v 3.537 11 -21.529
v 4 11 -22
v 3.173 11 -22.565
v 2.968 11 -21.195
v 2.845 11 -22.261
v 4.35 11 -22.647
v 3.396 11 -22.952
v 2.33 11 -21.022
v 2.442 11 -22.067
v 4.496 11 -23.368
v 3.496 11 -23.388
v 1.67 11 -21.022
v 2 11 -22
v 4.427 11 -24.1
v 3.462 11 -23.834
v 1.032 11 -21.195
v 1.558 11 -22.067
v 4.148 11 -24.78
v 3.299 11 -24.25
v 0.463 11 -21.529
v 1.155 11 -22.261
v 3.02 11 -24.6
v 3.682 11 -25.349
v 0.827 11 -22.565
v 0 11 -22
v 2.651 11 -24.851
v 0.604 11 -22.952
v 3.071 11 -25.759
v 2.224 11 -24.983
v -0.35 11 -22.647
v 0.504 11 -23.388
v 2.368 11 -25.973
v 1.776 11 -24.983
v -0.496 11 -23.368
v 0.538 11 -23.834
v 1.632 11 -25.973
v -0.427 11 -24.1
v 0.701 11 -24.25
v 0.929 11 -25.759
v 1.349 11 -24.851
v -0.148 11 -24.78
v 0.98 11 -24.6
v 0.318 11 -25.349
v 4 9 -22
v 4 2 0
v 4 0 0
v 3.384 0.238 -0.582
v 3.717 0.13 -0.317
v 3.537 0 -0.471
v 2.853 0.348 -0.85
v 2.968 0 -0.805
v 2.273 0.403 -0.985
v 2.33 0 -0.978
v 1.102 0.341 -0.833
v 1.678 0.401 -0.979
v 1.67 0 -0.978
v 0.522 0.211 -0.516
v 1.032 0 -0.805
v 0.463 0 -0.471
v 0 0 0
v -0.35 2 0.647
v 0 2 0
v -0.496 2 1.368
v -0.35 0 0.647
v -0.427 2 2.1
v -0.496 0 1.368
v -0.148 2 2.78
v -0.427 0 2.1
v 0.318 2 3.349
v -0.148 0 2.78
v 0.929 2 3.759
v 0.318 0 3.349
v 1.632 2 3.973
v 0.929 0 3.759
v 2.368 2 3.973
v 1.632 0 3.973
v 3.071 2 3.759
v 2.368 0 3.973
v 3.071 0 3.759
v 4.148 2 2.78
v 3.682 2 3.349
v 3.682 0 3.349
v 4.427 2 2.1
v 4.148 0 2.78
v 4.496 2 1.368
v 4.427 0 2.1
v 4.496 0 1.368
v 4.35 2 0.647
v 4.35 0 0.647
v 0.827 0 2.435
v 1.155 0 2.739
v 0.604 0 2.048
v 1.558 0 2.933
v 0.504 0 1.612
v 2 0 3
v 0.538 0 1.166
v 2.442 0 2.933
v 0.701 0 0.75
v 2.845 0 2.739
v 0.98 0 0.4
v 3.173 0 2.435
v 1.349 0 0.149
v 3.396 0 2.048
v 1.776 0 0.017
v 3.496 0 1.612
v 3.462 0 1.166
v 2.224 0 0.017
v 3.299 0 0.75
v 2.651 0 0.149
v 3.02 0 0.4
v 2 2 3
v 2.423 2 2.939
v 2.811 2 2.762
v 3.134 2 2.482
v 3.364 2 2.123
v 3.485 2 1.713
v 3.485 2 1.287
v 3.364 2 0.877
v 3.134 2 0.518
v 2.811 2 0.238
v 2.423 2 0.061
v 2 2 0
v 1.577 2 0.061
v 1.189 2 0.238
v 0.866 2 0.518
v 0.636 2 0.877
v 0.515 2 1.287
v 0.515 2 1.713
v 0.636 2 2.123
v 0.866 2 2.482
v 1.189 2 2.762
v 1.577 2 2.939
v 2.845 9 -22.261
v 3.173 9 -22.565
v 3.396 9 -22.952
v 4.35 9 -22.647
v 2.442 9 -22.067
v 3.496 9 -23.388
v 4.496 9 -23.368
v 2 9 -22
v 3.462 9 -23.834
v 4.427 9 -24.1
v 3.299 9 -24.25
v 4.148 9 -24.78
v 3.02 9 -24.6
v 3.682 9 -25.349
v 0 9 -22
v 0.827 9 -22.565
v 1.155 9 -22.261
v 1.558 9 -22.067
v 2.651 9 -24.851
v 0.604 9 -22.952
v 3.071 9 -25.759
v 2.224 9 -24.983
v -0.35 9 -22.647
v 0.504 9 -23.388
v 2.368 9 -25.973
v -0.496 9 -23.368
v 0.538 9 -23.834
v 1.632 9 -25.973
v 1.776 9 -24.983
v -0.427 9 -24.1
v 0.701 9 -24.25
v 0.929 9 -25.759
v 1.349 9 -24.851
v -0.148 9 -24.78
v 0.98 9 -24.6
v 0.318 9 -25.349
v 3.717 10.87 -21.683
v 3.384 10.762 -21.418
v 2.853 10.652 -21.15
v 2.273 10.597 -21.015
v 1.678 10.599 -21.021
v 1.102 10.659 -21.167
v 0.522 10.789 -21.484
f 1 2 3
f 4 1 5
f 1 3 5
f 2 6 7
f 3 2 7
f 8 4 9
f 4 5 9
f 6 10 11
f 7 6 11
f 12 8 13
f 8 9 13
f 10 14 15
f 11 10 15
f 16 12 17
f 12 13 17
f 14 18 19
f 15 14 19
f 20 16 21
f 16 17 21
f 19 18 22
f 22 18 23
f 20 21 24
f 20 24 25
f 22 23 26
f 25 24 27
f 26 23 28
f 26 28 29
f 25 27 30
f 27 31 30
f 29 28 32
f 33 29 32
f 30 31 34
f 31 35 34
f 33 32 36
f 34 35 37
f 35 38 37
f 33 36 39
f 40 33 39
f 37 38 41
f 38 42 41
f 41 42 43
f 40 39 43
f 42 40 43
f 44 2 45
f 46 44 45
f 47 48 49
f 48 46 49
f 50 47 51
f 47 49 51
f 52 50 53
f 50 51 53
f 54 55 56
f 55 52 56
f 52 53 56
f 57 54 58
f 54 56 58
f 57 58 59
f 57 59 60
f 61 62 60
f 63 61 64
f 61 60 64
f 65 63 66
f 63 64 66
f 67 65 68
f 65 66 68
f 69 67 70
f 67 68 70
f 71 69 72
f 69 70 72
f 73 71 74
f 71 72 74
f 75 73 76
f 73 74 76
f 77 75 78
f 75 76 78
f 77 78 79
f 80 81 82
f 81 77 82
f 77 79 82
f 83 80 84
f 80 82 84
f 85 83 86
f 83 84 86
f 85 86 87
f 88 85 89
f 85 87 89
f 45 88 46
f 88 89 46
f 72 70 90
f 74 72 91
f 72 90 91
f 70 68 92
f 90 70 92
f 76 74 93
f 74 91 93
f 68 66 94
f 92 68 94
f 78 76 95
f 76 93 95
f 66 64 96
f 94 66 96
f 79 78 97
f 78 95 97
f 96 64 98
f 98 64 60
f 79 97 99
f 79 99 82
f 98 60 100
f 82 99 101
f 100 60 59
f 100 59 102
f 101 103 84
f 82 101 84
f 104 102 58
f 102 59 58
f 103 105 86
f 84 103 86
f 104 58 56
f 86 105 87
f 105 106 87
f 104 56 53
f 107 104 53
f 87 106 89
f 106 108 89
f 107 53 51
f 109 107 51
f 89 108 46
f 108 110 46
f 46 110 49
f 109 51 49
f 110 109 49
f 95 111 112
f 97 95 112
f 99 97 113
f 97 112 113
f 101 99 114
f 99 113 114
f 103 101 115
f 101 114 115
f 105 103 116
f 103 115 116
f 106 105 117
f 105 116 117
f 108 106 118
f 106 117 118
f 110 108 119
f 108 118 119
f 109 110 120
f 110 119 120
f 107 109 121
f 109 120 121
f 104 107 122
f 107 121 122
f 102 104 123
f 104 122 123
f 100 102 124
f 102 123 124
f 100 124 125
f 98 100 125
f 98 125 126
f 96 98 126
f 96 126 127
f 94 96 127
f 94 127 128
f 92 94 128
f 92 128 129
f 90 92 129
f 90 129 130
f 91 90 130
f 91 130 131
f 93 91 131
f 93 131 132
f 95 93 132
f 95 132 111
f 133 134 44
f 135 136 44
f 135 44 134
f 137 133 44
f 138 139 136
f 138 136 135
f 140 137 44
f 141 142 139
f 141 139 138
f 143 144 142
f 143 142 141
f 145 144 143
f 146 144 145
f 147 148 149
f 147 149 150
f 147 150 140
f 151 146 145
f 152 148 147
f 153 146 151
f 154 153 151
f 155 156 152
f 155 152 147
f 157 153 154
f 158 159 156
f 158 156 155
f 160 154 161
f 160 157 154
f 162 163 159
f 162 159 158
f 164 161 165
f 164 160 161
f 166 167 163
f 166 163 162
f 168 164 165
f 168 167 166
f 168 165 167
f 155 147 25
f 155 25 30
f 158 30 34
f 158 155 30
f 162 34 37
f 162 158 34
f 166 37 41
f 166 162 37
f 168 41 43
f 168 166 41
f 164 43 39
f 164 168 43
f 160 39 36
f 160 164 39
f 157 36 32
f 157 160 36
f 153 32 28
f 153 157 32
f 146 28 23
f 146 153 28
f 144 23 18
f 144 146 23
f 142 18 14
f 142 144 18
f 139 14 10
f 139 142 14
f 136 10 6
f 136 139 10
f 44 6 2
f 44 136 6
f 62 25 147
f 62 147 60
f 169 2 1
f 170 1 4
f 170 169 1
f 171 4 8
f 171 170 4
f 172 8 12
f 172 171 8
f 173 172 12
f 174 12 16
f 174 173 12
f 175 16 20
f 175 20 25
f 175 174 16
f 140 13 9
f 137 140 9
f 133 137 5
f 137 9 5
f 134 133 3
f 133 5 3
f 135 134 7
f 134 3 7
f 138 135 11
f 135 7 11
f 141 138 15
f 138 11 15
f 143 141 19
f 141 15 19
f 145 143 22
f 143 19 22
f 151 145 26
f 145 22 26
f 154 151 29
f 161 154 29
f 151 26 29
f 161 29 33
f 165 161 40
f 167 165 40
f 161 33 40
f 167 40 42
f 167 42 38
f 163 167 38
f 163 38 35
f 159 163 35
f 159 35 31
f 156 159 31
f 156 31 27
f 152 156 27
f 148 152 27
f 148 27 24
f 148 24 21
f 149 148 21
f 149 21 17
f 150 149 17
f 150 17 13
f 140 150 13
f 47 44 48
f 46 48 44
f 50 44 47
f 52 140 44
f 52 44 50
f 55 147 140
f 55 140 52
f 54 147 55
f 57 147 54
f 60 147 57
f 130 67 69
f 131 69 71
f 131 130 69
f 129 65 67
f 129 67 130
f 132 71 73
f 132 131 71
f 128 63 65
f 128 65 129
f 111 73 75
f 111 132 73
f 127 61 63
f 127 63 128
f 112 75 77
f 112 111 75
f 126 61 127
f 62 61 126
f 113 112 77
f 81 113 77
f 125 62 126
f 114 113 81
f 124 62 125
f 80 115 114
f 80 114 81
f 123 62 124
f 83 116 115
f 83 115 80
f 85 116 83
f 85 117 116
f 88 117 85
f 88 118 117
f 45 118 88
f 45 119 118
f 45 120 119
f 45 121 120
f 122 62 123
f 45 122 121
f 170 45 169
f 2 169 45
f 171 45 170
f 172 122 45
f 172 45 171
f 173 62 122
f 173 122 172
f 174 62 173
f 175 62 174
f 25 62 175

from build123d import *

# Parameters (mm, degrees)
BOSS_EXTRUDE1_DEPTH = 4
SKETCH2_R           = 2.5
BOSS_EXTRUDE2_DEPTH = 2
SKETCH3_R           = 2.5
BOSS_EXTRUDE3_DEPTH = 2
SKETCH4_R           = 1.5
CUT_EXTRUDE1_DEPTH  = 28.879203719
SKETCH5_R           = 1.5
CUT_EXTRUDE2_DEPTH  = 29.587584718


with BuildPart() as part:
    # Sketch1 → Boss-Extrude1 (new body)
    with BuildSketch(Plane(origin=(0, 0, 0), x_dir=(0, 0, -1), z_dir=(1, 0, 0))):
        Polygon((0, 0), (0, 2), (22, 11), (22, 9), align=None)
    extrude(amount=BOSS_EXTRUDE1_DEPTH)

    # Sketch2 → Boss-Extrude2 (add)
    with BuildSketch(Plane(origin=(0, 0, 0), x_dir=(1, 0, 0), z_dir=(0, 1, 0))):
        with Locations((2, -1.5)):
            Circle(SKETCH2_R)
    extrude(amount=BOSS_EXTRUDE2_DEPTH)

    # Sketch3 → Boss-Extrude3 (add)
    with BuildSketch(Plane(origin=(0, 9, 0), x_dir=(-1, 0, 0), z_dir=(0, -1, 0))):
        with Locations((-2, 23.5)):
            Circle(SKETCH3_R)
    extrude(amount=-BOSS_EXTRUDE3_DEPTH)

    # Sketch4 → Cut-Extrude1 (cut, through all)
    with BuildSketch(Plane(origin=(0, 2, 0), x_dir=(1, 0, 0), z_dir=(0, 1, 0))):
        with Locations(Location((2, -1.5, 0), (0, 0, 270))):
            Circle(SKETCH4_R)
    extrude(amount=-CUT_EXTRUDE1_DEPTH, mode=Mode.SUBTRACT)

    # Sketch5 → Cut-Extrude2 (cut, through all)
    with BuildSketch(Plane(origin=(0, 11, 0), x_dir=(1, 0, 0), z_dir=(0, 1, 0))):
        with Locations(Location((2, 23.5, 0), (0, 0, 270))):
            Circle(SKETCH5_R)
    extrude(amount=-CUT_EXTRUDE2_DEPTH, mode=Mode.SUBTRACT)


solid = part.part
